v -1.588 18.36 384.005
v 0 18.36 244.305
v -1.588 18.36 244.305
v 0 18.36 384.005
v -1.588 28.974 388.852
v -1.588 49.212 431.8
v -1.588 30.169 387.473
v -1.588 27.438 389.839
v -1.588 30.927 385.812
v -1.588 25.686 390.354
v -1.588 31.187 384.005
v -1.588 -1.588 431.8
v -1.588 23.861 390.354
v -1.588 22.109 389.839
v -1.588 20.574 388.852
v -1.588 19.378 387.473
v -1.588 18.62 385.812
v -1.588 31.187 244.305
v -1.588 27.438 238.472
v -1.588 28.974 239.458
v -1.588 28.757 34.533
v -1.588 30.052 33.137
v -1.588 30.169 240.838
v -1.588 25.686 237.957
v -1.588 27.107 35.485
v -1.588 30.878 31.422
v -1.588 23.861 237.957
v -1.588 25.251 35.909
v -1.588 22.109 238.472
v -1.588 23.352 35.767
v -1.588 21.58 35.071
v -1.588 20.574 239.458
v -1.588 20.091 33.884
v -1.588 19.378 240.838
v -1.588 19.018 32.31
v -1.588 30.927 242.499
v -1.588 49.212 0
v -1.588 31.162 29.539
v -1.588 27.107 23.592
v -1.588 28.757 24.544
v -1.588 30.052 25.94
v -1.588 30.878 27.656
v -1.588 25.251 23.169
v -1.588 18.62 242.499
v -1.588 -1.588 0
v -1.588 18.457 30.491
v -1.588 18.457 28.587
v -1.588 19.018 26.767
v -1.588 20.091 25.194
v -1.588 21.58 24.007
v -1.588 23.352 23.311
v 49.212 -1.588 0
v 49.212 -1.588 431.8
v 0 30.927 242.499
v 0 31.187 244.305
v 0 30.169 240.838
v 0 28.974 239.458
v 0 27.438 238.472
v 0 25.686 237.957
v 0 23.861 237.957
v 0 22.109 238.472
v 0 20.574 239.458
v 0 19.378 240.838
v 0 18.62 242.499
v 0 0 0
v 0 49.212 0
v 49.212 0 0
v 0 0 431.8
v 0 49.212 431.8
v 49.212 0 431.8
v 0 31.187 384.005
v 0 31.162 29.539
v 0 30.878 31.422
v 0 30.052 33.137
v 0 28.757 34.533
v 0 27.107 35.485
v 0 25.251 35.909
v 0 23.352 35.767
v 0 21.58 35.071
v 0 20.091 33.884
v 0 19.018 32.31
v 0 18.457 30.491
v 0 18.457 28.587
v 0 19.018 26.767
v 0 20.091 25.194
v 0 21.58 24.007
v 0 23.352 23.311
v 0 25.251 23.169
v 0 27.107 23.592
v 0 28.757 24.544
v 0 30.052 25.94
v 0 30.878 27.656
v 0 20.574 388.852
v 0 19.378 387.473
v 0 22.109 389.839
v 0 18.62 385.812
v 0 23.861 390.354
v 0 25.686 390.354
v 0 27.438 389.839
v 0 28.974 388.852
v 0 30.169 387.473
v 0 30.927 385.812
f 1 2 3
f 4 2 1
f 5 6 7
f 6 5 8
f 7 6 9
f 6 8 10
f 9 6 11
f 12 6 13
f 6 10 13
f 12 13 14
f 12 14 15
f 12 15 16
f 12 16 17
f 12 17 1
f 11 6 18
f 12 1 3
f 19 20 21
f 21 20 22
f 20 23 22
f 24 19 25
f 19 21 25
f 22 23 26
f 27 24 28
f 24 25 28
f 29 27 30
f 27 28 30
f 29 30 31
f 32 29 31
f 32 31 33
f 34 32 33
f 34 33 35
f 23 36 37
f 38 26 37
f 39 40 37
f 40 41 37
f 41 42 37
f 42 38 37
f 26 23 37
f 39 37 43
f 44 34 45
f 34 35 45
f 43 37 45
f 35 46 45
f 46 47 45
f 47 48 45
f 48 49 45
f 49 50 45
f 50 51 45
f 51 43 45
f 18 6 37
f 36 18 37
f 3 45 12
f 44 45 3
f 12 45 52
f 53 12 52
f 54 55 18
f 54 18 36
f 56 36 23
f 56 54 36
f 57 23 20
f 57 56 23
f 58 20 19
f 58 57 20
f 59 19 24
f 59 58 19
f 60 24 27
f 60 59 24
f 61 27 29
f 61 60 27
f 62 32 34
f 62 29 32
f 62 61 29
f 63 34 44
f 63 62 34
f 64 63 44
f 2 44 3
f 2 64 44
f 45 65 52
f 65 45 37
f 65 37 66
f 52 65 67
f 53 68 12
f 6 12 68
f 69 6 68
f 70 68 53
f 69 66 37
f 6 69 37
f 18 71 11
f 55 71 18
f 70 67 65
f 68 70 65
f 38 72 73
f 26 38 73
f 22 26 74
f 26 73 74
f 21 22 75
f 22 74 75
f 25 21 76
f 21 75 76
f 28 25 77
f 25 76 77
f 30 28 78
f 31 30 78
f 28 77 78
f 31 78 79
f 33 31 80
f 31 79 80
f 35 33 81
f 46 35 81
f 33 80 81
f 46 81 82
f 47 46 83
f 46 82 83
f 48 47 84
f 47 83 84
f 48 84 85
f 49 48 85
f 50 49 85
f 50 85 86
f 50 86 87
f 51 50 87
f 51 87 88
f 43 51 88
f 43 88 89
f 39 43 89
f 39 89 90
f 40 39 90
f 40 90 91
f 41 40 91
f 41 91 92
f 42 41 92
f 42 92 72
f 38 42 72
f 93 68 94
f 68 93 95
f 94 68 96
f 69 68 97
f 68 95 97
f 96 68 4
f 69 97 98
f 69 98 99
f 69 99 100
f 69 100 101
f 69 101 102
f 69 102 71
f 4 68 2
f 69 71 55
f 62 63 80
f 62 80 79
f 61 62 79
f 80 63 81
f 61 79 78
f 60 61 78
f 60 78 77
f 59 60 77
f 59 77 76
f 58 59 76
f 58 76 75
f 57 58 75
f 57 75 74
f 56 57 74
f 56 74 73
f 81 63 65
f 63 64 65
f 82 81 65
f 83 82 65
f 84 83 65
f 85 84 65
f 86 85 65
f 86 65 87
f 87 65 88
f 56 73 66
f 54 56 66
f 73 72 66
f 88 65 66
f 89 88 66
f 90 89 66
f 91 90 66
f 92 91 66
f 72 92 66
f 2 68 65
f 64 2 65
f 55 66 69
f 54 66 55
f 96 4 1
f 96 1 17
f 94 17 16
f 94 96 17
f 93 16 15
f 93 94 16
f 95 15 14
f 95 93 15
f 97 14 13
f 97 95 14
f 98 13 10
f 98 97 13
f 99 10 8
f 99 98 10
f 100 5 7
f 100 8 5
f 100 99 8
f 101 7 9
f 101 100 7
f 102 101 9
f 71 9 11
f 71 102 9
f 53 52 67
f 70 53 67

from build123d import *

# Parameters (mm, degrees)
BOSS_EXTRUDE2_DEPTH = 431.8
CUT_EXTRUDE3_DEPTH  = 127
SKETCH7_R           = 6.3881
CUT_EXTRUDE4_DEPTH  = 127


with BuildPart() as part:
    # Sketch3 → Boss-Extrude2 (new body)
    with BuildSketch(Plane.XY):
        Polygon((0, 0), (0, 49.2125), (-1.5875, 49.2125), (-1.5875, -1.5875), (49.2125, -1.5875), (49.2125, 0), align=None)
    extrude(amount=BOSS_EXTRUDE2_DEPTH)

    # Sketch6 → Cut-Extrude3 (cut)
    with BuildSketch(Plane(origin=(0, 0, 0), x_dir=(0, 0, -1), z_dir=(1, 0, 0))):
        with BuildLine():
            Line((-384.0054804, 31.187094829), (-244.3054804, 31.187094829))
            ThreePointArc((-244.3054804, 31.187094829), (-237.8919804, 24.773594829), (-244.3054804, 18.360094829))
            Line((-244.3054804, 18.360094829), (-384.0054804, 18.360094829))
            ThreePointArc((-384.0054804, 18.360094829), (-390.4189804, 24.773594829), (-384.0054804, 31.187094829))
        make_face()
    extrude(amount=-CUT_EXTRUDE3_DEPTH, mode=Mode.SUBTRACT)

    # Sketch7 → Cut-Extrude4 (cut)
    with BuildSketch(Plane(origin=(0, 0, 0), x_dir=(0, 0, -1), z_dir=(1, 0, 0))):
        with Locations(Location((-29.538792285, 24.773594829, 0), (0, 0, 90))):
            Circle(SKETCH7_R)
    extrude(amount=-CUT_EXTRUDE4_DEPTH, mode=Mode.SUBTRACT)


solid = part.part
